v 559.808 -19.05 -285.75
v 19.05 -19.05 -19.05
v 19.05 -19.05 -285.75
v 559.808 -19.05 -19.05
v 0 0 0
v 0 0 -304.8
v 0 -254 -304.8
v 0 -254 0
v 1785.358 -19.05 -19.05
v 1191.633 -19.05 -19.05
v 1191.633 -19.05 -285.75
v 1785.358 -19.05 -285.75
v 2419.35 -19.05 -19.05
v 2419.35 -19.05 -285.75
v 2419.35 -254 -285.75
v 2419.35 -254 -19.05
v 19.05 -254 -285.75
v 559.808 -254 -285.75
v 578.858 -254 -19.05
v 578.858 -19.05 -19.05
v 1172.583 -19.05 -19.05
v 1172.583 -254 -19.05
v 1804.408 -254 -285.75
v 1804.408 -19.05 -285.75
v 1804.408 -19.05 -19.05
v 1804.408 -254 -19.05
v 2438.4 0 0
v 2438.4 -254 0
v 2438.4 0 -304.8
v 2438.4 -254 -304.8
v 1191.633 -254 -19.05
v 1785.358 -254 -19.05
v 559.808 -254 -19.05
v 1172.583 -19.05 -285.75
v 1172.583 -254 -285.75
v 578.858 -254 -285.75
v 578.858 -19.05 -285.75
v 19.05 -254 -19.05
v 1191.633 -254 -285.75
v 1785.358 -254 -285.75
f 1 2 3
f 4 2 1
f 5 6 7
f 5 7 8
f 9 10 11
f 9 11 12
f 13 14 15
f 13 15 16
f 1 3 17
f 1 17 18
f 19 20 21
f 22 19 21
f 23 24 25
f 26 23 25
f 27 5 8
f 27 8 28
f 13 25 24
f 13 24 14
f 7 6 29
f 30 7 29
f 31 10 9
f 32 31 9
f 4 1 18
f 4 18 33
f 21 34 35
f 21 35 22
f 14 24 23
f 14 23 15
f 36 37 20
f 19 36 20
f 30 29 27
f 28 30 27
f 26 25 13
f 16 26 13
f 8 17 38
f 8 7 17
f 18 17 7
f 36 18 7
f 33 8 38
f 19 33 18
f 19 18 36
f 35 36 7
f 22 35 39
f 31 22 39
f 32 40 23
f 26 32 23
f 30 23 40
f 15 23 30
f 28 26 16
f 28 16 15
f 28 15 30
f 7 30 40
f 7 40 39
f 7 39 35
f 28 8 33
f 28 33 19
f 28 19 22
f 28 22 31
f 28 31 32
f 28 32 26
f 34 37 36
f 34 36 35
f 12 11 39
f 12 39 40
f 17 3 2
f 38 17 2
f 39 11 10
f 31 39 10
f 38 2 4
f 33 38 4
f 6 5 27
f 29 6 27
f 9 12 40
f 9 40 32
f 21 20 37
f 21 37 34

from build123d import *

# Parameters (mm, degrees)
F0_W     = 2438.4
F0_H     = 304.8
F0_W_2   = 2400.3
F0_H_2   = 266.7
F1_DEPTH = 254
F2_W     = 2438.4
F2_H     = 304.8
F3_DEPTH = 19.05
F4_W     = 19.05
F4_H     = 266.7
F5_DEPTH = 234.95


with BuildPart() as f1:
    # F0 (on Front) → F1 (new body)
    with BuildSketch(Plane.XZ):
        with Locations((1219.2, -152.4)):
            Rectangle(F0_W, F0_H)
        with Locations((1219.2, -152.4)):
            Rectangle(F0_W_2, F0_H_2, mode=Mode.SUBTRACT)
    extrude(amount=F1_DEPTH)

    # F2 (on Front) → F3 (join)
    with BuildSketch(Plane.XZ):
        with Locations((1219.2, -152.4)):
            Rectangle(F2_W, F2_H)
    extrude(amount=F3_DEPTH)

    # F4 (on face) → F5 (join)
    with BuildSketch(Plane.XZ.offset(19.05)):
        with Locations((1182.107865, -152.4)):
            Rectangle(F4_W, F4_H)
        with Locations((1794.882865, -152.4)):
            Rectangle(F4_W, F4_H)
        with Locations((569.332865, -152.4)):
            Rectangle(F4_W, F4_H)
    extrude(amount=F5_DEPTH)


solid = f1.part
